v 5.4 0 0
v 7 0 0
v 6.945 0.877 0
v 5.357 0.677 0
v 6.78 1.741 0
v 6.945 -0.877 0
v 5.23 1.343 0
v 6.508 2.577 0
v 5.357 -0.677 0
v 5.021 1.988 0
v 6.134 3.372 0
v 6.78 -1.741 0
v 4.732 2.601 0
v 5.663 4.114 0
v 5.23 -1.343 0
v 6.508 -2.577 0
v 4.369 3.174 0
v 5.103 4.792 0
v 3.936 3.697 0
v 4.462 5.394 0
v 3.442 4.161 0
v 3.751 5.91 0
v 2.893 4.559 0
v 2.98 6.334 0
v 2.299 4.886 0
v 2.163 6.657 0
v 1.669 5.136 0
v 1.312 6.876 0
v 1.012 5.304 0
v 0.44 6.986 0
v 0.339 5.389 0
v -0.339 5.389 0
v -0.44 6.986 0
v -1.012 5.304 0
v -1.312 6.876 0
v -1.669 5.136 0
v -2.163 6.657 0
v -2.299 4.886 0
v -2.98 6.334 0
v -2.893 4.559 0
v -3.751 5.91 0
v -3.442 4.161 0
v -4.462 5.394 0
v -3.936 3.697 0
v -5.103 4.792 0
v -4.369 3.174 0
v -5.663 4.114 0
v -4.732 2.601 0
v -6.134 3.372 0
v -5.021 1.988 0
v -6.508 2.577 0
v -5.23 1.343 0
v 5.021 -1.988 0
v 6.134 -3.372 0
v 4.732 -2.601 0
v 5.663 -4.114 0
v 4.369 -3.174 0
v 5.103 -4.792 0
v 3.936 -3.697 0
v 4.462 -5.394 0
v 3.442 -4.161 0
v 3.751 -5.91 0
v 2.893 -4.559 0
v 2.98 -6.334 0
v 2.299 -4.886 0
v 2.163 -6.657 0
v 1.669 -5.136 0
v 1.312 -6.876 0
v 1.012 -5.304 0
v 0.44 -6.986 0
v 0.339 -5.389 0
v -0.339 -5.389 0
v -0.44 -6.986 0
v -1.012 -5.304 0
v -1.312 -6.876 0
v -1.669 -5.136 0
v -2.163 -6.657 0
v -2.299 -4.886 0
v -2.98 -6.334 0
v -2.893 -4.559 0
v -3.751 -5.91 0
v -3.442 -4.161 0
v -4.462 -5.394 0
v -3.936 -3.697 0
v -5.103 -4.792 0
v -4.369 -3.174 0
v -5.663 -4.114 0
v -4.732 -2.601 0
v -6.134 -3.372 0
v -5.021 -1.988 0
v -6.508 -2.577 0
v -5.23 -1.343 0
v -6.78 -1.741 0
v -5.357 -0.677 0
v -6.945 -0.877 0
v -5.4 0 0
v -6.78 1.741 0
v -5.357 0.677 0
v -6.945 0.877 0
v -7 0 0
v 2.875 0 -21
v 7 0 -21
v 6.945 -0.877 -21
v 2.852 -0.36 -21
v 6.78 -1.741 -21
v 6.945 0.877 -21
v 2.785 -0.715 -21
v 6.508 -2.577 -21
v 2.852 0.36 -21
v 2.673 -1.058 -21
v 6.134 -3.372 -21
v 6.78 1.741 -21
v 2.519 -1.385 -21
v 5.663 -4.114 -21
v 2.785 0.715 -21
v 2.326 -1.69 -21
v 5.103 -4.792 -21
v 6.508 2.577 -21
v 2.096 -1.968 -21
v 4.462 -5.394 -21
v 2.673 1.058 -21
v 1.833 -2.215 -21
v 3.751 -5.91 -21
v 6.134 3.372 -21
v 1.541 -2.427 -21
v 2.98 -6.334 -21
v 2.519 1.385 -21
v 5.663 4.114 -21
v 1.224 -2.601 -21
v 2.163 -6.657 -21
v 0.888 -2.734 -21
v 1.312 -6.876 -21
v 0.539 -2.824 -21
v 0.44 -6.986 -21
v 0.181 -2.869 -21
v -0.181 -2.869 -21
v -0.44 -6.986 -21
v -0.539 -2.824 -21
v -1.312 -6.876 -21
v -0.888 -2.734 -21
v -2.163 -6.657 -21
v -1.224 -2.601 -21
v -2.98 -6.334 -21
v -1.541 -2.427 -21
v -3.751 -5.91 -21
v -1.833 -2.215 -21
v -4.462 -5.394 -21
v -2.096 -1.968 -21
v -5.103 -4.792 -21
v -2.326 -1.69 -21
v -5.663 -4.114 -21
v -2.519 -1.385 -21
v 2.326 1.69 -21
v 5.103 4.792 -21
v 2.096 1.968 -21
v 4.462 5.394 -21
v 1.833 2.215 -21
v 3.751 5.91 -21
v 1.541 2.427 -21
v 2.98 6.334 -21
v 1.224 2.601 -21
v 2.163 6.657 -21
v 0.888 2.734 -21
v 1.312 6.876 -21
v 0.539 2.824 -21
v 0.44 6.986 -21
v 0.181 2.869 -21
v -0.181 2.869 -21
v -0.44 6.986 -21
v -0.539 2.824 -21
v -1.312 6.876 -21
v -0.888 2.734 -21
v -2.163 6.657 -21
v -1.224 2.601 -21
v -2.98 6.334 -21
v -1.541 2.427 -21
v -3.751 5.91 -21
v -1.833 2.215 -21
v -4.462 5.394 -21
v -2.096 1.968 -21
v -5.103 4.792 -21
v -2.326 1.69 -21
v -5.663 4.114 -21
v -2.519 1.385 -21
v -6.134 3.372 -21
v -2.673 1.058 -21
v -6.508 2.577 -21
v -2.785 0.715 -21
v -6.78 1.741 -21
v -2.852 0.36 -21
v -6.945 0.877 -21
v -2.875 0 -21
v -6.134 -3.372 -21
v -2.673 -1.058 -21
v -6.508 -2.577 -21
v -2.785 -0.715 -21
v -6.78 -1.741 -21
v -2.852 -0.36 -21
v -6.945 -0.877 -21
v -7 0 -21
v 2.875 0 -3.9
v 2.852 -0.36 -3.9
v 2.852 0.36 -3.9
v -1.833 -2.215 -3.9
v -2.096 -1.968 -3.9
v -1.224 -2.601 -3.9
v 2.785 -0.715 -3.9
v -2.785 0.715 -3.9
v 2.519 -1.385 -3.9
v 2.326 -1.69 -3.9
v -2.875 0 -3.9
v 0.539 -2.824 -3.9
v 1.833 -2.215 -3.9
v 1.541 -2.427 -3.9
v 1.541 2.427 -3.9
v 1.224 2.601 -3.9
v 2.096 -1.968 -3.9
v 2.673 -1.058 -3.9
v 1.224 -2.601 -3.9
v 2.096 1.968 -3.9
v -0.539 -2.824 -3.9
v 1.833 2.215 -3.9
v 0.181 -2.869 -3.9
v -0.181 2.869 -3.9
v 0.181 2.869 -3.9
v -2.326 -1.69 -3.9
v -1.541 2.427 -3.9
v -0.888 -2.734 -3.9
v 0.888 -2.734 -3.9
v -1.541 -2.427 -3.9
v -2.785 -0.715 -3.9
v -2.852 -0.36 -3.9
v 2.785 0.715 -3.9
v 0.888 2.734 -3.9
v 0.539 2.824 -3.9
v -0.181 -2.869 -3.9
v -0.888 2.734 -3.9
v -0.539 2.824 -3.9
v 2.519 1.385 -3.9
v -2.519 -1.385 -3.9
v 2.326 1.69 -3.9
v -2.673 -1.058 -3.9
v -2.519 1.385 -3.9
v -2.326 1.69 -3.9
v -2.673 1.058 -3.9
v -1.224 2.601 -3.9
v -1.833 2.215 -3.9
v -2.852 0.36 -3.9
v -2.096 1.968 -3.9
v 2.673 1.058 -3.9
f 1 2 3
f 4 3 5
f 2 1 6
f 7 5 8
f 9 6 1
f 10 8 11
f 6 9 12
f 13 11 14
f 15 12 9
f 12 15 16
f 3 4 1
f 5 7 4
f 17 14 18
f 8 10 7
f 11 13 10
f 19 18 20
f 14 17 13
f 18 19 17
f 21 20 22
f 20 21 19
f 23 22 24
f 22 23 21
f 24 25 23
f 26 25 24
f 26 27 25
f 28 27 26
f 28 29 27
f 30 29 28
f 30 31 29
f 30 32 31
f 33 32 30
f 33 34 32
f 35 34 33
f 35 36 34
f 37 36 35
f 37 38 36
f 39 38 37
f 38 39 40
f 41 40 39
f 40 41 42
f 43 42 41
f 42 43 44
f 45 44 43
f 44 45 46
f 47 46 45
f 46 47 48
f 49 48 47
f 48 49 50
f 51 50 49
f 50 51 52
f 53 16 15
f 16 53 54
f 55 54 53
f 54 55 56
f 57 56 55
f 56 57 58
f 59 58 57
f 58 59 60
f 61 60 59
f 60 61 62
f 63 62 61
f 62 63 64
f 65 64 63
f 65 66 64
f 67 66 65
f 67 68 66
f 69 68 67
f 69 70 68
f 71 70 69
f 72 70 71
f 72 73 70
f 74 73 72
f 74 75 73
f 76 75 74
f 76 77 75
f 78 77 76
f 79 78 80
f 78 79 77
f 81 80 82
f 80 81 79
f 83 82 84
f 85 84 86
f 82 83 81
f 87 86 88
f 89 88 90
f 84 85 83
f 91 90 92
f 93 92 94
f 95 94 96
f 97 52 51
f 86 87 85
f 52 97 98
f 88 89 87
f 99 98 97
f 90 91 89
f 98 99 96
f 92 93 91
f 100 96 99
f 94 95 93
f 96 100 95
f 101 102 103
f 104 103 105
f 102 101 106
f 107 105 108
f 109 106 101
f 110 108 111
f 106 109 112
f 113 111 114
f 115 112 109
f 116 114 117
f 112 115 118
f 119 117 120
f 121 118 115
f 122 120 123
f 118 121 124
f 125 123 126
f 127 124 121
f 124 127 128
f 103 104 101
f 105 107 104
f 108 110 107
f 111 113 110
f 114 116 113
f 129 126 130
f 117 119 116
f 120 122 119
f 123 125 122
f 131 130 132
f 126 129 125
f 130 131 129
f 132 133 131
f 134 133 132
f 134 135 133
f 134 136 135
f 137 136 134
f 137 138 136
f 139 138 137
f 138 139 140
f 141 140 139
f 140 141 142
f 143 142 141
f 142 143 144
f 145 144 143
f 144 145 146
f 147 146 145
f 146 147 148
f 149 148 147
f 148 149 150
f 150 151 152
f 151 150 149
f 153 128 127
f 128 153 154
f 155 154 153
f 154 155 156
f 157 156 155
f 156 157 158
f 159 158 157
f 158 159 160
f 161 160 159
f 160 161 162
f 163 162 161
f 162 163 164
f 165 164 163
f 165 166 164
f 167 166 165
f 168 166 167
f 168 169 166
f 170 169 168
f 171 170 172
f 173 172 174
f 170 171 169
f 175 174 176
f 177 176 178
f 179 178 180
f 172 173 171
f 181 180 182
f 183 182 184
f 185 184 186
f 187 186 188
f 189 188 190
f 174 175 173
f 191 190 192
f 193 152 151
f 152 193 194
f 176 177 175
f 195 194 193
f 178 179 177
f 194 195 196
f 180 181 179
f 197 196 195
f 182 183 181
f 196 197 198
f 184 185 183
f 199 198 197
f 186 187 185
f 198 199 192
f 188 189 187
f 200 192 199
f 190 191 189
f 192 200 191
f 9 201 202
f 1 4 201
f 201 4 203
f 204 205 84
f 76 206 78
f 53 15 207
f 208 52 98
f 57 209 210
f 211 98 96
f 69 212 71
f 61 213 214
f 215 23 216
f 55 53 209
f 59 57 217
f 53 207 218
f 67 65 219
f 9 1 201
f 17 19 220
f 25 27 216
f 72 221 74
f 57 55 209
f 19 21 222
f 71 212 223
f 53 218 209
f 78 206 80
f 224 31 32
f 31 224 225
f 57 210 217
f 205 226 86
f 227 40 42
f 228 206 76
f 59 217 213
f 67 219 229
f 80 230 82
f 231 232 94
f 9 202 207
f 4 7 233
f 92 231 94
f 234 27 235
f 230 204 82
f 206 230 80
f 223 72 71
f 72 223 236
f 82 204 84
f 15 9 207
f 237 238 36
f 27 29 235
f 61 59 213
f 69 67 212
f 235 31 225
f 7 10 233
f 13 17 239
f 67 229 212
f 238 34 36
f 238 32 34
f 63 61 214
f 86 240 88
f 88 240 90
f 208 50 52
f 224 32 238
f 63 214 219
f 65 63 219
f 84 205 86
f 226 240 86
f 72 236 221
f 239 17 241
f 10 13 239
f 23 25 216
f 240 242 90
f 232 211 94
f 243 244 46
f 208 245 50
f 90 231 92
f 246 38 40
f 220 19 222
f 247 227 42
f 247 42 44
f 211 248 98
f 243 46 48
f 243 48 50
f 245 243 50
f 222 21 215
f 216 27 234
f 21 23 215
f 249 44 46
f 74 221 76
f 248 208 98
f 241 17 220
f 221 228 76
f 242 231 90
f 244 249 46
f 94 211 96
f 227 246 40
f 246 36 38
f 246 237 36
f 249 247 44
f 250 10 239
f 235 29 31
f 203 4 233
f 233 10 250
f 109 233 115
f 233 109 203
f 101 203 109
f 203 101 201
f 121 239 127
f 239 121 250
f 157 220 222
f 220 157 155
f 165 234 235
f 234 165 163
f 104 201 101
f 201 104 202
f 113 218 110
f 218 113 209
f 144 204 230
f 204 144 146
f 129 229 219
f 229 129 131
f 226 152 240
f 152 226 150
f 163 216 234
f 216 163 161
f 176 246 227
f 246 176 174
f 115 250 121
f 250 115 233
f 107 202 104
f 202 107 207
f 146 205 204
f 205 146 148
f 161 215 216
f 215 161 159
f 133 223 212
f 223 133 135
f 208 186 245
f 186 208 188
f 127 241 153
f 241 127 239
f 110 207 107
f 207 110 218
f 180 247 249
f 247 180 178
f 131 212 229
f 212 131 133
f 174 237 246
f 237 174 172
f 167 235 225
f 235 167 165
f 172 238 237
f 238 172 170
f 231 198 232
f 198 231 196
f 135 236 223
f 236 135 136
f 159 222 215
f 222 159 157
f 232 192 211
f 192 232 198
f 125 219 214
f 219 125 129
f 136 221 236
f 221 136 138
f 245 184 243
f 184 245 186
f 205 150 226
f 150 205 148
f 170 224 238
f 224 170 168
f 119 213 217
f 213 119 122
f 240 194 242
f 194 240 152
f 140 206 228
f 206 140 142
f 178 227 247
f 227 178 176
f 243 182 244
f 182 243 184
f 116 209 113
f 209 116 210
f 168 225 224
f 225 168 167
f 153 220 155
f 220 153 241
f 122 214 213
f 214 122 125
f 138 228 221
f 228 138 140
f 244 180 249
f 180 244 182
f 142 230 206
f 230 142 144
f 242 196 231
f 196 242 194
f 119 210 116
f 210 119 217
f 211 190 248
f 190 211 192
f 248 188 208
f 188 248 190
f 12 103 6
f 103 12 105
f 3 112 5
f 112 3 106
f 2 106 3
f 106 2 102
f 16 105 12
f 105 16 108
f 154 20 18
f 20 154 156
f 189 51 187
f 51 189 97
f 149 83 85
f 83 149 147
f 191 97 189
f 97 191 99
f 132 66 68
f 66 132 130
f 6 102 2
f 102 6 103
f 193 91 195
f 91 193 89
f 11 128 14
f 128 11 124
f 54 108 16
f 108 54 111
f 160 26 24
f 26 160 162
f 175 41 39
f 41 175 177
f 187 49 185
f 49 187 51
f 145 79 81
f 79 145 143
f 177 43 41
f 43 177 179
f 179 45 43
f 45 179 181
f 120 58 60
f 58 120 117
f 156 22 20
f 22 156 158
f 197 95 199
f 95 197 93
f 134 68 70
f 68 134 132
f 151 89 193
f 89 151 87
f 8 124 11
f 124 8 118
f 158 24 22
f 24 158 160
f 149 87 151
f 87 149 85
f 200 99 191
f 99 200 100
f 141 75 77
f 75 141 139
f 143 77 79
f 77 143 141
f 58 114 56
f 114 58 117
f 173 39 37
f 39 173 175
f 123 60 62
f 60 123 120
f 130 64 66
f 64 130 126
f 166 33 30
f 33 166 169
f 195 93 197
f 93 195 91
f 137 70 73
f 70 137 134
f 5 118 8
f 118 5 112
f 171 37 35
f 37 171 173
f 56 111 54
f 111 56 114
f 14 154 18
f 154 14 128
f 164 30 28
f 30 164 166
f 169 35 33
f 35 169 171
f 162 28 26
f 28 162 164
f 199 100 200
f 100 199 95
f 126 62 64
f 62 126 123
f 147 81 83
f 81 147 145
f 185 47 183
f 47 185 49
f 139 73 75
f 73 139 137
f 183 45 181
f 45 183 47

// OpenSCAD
$fn = 50;


difference() {
	union() {
		translate(v = [0, 0, -21.0000000000]) {
			cylinder(h = 21, r = 7.0000000000);
		}
		cylinder(h = 0, r = 17.0000000000);
	}
	union() {
		translate(v = [0, 0, 0]) {
			rotate(a = [0, 0, 0]) {
				difference() {
					union() {
						#translate(v = [0, 0, -21.0000000000]) {
							cylinder(h = 21, r = 2.6000000000);
						}
						#translate(v = [0, 0, -3.9000000000]) {
							cylinder(h = 3.9000000000, r1 = 2.8750000000, r2 = 5.4000000000);
						}
						#translate(v = [0, 0, -21.0000000000]) {
							cylinder(h = 21, r = 2.8750000000);
						}
						#translate(v = [0, 0, -21.0000000000]) {
							cylinder(h = 21, r = 2.6000000000);
						}
					}
					union();
				}
			}
		}
	}
}
